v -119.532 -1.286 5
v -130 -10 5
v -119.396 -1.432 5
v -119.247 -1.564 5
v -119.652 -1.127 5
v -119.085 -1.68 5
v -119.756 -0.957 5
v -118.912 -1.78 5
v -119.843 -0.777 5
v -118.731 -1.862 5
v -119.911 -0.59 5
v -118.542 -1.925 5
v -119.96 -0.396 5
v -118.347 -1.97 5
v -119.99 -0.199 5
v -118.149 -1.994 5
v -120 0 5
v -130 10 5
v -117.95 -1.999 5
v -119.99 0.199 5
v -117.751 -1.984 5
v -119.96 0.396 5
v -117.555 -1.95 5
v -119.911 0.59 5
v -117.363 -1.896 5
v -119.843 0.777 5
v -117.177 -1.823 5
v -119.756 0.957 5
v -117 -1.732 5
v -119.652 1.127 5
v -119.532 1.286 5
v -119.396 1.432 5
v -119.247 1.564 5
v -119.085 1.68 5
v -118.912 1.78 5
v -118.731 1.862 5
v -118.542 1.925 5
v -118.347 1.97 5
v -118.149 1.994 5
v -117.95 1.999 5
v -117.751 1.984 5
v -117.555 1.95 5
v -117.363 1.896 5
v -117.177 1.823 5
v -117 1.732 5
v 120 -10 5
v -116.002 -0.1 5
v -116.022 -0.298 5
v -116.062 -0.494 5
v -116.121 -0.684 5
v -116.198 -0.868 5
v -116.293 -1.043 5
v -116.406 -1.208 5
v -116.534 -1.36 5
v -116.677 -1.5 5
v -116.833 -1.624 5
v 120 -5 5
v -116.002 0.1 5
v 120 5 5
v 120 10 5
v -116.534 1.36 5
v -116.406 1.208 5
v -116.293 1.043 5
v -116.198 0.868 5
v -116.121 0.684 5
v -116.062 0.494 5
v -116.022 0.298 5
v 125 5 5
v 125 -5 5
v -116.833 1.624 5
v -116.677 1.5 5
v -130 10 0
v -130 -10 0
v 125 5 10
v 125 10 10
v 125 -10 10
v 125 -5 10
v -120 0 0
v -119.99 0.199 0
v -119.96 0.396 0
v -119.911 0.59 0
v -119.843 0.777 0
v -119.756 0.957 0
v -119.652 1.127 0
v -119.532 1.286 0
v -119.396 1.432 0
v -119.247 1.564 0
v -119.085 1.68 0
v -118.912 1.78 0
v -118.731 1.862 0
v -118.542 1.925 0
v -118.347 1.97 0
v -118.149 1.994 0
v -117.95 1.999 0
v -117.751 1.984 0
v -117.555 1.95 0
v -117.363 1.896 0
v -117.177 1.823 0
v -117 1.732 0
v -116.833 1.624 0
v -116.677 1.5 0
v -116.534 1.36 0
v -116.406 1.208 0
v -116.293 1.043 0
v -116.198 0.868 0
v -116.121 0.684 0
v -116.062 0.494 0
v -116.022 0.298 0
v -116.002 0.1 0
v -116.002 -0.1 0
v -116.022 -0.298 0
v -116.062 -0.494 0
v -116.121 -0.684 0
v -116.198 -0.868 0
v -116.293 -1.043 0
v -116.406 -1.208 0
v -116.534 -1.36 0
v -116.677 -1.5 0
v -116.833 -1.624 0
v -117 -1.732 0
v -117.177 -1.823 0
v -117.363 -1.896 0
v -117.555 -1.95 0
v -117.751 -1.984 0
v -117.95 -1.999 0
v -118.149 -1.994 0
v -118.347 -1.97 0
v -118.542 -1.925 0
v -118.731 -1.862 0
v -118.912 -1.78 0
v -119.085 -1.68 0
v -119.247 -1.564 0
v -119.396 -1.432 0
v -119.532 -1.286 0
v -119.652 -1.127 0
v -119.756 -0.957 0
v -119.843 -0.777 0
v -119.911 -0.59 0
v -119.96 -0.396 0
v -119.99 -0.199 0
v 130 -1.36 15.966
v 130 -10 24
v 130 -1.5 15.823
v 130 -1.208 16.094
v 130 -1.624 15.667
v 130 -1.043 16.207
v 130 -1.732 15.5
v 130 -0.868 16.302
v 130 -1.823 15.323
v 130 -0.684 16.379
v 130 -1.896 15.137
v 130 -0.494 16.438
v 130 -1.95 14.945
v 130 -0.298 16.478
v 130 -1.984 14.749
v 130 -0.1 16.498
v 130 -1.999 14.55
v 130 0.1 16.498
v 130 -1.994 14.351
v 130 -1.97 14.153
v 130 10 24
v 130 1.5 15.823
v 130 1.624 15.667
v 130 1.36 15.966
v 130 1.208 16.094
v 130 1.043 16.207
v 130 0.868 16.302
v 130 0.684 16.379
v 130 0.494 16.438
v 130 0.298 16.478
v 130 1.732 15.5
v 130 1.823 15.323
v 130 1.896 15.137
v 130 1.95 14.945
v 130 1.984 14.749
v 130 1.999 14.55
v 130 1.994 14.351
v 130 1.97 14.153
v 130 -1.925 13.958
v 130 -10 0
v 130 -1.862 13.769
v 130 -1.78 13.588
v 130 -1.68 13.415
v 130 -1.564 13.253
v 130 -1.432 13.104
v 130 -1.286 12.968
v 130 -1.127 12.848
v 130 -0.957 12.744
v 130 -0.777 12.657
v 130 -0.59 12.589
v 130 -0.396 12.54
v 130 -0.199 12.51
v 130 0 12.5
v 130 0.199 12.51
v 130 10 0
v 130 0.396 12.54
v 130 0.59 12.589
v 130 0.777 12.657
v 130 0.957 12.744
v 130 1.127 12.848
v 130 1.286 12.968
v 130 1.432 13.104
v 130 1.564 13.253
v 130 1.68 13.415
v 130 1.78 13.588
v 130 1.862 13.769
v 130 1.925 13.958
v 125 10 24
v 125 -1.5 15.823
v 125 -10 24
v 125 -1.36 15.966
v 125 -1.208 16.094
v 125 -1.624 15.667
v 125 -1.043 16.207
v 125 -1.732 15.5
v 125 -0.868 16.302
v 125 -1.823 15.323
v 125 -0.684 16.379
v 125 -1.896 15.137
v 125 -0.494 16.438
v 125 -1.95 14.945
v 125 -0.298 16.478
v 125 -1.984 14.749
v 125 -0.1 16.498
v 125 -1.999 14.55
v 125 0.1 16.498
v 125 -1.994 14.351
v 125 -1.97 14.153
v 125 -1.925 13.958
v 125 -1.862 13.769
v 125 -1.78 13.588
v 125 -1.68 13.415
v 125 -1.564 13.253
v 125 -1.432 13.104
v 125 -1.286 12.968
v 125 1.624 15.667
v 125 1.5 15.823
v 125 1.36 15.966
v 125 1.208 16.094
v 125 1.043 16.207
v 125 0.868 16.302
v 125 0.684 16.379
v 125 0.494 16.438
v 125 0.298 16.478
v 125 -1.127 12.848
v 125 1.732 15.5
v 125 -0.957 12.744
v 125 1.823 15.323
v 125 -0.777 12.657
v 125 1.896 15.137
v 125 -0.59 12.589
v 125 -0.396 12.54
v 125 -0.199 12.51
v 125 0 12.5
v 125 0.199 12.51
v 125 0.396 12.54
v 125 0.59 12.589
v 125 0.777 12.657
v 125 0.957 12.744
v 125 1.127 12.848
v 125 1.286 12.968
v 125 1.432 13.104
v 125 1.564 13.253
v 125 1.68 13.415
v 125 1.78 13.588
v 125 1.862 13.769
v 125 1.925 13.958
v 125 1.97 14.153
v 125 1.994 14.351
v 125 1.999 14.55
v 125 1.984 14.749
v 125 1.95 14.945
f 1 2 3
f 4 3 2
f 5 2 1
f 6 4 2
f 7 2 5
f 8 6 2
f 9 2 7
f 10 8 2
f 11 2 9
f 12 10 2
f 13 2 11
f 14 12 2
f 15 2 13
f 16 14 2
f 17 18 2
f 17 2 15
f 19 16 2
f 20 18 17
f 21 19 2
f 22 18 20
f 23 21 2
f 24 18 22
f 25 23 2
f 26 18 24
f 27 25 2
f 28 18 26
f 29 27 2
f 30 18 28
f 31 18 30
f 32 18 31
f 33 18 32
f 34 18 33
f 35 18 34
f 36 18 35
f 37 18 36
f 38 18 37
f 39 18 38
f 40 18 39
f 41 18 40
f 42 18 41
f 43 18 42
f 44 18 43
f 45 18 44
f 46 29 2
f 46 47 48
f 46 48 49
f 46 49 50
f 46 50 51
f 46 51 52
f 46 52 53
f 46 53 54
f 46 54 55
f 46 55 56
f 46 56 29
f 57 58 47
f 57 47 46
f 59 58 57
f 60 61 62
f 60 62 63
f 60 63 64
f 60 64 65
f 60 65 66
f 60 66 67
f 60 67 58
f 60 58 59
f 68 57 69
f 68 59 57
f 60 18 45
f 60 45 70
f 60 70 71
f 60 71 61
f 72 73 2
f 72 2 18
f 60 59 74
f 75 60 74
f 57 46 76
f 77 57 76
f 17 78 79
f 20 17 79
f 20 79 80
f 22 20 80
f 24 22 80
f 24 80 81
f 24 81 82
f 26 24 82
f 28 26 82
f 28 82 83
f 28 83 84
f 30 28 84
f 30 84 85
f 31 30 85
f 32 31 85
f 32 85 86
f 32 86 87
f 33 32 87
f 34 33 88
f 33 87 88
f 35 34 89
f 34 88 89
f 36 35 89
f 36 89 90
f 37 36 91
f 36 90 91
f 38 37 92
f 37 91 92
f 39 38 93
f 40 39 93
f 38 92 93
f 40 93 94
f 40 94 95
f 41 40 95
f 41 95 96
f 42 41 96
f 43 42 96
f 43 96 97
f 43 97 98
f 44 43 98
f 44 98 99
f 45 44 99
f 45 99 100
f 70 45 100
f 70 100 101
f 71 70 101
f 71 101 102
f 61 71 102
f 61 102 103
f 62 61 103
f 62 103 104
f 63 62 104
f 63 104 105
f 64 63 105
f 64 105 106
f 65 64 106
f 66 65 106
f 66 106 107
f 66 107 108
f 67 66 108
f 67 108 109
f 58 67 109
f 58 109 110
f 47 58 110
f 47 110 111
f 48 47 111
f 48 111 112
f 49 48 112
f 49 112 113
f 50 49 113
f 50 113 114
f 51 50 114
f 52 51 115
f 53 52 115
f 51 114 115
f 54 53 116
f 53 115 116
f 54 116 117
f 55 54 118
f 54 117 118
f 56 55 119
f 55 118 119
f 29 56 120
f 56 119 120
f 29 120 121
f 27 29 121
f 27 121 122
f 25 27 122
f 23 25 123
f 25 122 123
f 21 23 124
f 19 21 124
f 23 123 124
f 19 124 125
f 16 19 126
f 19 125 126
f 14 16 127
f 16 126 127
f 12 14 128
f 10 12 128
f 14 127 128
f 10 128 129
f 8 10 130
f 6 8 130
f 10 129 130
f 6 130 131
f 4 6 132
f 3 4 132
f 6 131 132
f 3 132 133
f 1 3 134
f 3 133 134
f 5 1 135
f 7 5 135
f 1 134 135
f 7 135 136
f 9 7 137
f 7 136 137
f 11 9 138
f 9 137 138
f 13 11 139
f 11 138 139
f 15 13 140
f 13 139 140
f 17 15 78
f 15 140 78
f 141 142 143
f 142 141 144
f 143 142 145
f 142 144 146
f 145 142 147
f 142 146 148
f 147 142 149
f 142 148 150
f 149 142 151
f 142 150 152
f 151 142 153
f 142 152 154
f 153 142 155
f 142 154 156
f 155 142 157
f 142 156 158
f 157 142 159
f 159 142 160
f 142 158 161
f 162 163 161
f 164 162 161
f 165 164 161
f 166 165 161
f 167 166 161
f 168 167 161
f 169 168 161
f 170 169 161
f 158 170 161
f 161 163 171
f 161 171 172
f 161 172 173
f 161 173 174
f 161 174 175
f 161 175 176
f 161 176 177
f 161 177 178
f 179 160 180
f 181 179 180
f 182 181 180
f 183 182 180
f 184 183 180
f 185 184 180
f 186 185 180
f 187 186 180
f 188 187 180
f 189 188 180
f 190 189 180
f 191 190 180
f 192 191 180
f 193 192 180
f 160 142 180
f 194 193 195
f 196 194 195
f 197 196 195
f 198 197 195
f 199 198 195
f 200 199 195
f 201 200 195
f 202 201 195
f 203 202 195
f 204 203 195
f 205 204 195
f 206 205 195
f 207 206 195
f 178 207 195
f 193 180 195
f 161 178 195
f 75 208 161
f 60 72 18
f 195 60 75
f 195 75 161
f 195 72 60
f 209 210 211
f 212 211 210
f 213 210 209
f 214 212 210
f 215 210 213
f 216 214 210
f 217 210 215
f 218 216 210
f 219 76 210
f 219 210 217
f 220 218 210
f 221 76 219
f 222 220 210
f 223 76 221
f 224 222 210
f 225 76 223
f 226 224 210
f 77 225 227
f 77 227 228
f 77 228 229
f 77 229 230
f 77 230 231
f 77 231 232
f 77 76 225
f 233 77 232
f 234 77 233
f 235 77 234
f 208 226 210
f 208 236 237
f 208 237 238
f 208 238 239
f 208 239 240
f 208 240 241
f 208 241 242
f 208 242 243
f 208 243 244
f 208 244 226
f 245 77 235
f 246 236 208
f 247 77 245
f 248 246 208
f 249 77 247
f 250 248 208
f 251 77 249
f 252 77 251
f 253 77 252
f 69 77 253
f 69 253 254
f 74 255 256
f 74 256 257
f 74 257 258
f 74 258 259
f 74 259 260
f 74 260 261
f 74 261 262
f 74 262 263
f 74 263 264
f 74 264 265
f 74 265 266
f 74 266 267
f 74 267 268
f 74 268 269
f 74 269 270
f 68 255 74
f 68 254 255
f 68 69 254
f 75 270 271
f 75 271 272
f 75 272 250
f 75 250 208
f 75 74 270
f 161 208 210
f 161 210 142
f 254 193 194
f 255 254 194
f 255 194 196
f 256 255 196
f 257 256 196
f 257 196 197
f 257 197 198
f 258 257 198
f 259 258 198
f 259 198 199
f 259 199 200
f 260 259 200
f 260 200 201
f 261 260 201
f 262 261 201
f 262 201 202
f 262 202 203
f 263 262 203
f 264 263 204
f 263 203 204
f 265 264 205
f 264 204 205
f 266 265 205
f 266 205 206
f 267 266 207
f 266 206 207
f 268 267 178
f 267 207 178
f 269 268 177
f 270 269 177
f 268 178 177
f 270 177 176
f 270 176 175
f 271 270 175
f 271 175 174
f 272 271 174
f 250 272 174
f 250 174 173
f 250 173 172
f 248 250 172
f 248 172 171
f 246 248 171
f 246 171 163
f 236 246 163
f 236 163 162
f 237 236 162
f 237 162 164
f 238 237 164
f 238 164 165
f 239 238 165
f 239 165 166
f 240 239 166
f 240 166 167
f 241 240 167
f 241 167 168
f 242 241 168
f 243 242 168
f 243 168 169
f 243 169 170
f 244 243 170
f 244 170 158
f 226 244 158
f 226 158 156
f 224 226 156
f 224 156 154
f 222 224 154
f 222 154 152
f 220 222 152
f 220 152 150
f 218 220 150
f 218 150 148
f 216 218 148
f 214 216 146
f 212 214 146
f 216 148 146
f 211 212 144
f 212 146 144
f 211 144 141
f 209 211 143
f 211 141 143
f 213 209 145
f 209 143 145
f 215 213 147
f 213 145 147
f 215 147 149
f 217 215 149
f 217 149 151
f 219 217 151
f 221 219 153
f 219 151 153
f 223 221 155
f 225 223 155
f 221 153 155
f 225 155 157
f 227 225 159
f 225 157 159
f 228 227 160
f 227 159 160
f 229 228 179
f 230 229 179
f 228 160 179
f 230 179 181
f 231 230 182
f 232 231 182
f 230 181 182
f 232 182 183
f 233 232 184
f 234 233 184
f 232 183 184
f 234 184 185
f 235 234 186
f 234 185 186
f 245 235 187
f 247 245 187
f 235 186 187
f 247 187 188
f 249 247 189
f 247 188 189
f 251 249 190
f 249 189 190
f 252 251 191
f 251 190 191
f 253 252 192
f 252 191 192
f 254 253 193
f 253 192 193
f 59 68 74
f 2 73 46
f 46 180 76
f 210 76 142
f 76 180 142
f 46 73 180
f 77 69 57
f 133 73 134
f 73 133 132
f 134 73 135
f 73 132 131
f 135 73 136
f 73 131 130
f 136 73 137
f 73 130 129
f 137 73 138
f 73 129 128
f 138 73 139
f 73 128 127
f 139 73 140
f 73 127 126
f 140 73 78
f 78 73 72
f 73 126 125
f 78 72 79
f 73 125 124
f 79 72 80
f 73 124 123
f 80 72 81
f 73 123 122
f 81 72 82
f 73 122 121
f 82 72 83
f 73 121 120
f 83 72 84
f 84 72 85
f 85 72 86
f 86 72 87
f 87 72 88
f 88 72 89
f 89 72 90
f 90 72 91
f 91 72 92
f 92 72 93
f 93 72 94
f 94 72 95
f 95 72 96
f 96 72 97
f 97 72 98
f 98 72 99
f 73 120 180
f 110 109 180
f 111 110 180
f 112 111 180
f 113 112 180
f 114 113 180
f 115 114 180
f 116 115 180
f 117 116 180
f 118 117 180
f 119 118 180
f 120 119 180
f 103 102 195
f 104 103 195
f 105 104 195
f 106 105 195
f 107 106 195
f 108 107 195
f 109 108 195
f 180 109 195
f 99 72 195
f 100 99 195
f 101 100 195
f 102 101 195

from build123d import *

# Parameters (mm, degrees)
SKETCH1_W           = 260
SKETCH1_H           = 20
BOSS_EXTRUDE1_DEPTH = 5
SKETCH2_W           = 5
SKETCH2_H           = 20
BOSS_EXTRUDE2_DEPTH = 19
SKETCH3_R           = 2
CUT_EXTRUDE1_DEPTH  = 262.296766149
SKETCH4_W           = 5
SKETCH4_H           = 5
BOSS_EXTRUDE3_DEPTH = 5
CUT_EXTRUDE2_DEPTH  = 134.701159307
SKETCH6_R           = 2
CUT_EXTRUDE3_DEPTH  = 133.574507353


with BuildPart() as part:
    # Sketch1 → Boss-Extrude1 (new body)
    with BuildSketch(Plane.XY):
        Rectangle(SKETCH1_W, SKETCH1_H)
    extrude(amount=BOSS_EXTRUDE1_DEPTH)

    # Sketch2 → Boss-Extrude2 (add)
    with BuildSketch(Plane.XY.offset(5)):
        with Locations((127.5, 0)):
            Rectangle(SKETCH2_W, SKETCH2_H)
    extrude(amount=BOSS_EXTRUDE2_DEPTH)

    # Sketch3 → Cut-Extrude1 (cut, through all)
    with BuildSketch(Plane(origin=(130, 0, 0), x_dir=(0, 0, -1), z_dir=(1, 0, 0))):
        with Locations((-14.5, 0)):
            Circle(SKETCH3_R)
    extrude(amount=-CUT_EXTRUDE1_DEPTH, mode=Mode.SUBTRACT)

    # Sketch4 → Boss-Extrude3 (add)
    with BuildSketch(Plane.ZY.offset(-125)):
        with Locations((7.5, -7.5)):
            Rectangle(SKETCH4_W, SKETCH4_H)
        with Locations((7.5, 7.5)):
            Rectangle(SKETCH4_W, SKETCH4_H)
    extrude(amount=BOSS_EXTRUDE3_DEPTH)

    # Sketch5 → Cut-Extrude2 (cut, through all)
    with BuildSketch(Plane.XZ.offset(10)):
        Polygon((120, 5), (125, 10), (120, 10), align=None)
    extrude(amount=-CUT_EXTRUDE2_DEPTH, mode=Mode.SUBTRACT)

    # Sketch6 → Cut-Extrude3 (cut, through all)
    with BuildSketch(Plane(origin=(0, 0, 0), x_dir=(-1, 0, 0), z_dir=(0, 0, -1))):
        with Locations((118, 0)):
            Circle(SKETCH6_R)
    extrude(amount=-CUT_EXTRUDE3_DEPTH, mode=Mode.SUBTRACT)


solid = part.part
